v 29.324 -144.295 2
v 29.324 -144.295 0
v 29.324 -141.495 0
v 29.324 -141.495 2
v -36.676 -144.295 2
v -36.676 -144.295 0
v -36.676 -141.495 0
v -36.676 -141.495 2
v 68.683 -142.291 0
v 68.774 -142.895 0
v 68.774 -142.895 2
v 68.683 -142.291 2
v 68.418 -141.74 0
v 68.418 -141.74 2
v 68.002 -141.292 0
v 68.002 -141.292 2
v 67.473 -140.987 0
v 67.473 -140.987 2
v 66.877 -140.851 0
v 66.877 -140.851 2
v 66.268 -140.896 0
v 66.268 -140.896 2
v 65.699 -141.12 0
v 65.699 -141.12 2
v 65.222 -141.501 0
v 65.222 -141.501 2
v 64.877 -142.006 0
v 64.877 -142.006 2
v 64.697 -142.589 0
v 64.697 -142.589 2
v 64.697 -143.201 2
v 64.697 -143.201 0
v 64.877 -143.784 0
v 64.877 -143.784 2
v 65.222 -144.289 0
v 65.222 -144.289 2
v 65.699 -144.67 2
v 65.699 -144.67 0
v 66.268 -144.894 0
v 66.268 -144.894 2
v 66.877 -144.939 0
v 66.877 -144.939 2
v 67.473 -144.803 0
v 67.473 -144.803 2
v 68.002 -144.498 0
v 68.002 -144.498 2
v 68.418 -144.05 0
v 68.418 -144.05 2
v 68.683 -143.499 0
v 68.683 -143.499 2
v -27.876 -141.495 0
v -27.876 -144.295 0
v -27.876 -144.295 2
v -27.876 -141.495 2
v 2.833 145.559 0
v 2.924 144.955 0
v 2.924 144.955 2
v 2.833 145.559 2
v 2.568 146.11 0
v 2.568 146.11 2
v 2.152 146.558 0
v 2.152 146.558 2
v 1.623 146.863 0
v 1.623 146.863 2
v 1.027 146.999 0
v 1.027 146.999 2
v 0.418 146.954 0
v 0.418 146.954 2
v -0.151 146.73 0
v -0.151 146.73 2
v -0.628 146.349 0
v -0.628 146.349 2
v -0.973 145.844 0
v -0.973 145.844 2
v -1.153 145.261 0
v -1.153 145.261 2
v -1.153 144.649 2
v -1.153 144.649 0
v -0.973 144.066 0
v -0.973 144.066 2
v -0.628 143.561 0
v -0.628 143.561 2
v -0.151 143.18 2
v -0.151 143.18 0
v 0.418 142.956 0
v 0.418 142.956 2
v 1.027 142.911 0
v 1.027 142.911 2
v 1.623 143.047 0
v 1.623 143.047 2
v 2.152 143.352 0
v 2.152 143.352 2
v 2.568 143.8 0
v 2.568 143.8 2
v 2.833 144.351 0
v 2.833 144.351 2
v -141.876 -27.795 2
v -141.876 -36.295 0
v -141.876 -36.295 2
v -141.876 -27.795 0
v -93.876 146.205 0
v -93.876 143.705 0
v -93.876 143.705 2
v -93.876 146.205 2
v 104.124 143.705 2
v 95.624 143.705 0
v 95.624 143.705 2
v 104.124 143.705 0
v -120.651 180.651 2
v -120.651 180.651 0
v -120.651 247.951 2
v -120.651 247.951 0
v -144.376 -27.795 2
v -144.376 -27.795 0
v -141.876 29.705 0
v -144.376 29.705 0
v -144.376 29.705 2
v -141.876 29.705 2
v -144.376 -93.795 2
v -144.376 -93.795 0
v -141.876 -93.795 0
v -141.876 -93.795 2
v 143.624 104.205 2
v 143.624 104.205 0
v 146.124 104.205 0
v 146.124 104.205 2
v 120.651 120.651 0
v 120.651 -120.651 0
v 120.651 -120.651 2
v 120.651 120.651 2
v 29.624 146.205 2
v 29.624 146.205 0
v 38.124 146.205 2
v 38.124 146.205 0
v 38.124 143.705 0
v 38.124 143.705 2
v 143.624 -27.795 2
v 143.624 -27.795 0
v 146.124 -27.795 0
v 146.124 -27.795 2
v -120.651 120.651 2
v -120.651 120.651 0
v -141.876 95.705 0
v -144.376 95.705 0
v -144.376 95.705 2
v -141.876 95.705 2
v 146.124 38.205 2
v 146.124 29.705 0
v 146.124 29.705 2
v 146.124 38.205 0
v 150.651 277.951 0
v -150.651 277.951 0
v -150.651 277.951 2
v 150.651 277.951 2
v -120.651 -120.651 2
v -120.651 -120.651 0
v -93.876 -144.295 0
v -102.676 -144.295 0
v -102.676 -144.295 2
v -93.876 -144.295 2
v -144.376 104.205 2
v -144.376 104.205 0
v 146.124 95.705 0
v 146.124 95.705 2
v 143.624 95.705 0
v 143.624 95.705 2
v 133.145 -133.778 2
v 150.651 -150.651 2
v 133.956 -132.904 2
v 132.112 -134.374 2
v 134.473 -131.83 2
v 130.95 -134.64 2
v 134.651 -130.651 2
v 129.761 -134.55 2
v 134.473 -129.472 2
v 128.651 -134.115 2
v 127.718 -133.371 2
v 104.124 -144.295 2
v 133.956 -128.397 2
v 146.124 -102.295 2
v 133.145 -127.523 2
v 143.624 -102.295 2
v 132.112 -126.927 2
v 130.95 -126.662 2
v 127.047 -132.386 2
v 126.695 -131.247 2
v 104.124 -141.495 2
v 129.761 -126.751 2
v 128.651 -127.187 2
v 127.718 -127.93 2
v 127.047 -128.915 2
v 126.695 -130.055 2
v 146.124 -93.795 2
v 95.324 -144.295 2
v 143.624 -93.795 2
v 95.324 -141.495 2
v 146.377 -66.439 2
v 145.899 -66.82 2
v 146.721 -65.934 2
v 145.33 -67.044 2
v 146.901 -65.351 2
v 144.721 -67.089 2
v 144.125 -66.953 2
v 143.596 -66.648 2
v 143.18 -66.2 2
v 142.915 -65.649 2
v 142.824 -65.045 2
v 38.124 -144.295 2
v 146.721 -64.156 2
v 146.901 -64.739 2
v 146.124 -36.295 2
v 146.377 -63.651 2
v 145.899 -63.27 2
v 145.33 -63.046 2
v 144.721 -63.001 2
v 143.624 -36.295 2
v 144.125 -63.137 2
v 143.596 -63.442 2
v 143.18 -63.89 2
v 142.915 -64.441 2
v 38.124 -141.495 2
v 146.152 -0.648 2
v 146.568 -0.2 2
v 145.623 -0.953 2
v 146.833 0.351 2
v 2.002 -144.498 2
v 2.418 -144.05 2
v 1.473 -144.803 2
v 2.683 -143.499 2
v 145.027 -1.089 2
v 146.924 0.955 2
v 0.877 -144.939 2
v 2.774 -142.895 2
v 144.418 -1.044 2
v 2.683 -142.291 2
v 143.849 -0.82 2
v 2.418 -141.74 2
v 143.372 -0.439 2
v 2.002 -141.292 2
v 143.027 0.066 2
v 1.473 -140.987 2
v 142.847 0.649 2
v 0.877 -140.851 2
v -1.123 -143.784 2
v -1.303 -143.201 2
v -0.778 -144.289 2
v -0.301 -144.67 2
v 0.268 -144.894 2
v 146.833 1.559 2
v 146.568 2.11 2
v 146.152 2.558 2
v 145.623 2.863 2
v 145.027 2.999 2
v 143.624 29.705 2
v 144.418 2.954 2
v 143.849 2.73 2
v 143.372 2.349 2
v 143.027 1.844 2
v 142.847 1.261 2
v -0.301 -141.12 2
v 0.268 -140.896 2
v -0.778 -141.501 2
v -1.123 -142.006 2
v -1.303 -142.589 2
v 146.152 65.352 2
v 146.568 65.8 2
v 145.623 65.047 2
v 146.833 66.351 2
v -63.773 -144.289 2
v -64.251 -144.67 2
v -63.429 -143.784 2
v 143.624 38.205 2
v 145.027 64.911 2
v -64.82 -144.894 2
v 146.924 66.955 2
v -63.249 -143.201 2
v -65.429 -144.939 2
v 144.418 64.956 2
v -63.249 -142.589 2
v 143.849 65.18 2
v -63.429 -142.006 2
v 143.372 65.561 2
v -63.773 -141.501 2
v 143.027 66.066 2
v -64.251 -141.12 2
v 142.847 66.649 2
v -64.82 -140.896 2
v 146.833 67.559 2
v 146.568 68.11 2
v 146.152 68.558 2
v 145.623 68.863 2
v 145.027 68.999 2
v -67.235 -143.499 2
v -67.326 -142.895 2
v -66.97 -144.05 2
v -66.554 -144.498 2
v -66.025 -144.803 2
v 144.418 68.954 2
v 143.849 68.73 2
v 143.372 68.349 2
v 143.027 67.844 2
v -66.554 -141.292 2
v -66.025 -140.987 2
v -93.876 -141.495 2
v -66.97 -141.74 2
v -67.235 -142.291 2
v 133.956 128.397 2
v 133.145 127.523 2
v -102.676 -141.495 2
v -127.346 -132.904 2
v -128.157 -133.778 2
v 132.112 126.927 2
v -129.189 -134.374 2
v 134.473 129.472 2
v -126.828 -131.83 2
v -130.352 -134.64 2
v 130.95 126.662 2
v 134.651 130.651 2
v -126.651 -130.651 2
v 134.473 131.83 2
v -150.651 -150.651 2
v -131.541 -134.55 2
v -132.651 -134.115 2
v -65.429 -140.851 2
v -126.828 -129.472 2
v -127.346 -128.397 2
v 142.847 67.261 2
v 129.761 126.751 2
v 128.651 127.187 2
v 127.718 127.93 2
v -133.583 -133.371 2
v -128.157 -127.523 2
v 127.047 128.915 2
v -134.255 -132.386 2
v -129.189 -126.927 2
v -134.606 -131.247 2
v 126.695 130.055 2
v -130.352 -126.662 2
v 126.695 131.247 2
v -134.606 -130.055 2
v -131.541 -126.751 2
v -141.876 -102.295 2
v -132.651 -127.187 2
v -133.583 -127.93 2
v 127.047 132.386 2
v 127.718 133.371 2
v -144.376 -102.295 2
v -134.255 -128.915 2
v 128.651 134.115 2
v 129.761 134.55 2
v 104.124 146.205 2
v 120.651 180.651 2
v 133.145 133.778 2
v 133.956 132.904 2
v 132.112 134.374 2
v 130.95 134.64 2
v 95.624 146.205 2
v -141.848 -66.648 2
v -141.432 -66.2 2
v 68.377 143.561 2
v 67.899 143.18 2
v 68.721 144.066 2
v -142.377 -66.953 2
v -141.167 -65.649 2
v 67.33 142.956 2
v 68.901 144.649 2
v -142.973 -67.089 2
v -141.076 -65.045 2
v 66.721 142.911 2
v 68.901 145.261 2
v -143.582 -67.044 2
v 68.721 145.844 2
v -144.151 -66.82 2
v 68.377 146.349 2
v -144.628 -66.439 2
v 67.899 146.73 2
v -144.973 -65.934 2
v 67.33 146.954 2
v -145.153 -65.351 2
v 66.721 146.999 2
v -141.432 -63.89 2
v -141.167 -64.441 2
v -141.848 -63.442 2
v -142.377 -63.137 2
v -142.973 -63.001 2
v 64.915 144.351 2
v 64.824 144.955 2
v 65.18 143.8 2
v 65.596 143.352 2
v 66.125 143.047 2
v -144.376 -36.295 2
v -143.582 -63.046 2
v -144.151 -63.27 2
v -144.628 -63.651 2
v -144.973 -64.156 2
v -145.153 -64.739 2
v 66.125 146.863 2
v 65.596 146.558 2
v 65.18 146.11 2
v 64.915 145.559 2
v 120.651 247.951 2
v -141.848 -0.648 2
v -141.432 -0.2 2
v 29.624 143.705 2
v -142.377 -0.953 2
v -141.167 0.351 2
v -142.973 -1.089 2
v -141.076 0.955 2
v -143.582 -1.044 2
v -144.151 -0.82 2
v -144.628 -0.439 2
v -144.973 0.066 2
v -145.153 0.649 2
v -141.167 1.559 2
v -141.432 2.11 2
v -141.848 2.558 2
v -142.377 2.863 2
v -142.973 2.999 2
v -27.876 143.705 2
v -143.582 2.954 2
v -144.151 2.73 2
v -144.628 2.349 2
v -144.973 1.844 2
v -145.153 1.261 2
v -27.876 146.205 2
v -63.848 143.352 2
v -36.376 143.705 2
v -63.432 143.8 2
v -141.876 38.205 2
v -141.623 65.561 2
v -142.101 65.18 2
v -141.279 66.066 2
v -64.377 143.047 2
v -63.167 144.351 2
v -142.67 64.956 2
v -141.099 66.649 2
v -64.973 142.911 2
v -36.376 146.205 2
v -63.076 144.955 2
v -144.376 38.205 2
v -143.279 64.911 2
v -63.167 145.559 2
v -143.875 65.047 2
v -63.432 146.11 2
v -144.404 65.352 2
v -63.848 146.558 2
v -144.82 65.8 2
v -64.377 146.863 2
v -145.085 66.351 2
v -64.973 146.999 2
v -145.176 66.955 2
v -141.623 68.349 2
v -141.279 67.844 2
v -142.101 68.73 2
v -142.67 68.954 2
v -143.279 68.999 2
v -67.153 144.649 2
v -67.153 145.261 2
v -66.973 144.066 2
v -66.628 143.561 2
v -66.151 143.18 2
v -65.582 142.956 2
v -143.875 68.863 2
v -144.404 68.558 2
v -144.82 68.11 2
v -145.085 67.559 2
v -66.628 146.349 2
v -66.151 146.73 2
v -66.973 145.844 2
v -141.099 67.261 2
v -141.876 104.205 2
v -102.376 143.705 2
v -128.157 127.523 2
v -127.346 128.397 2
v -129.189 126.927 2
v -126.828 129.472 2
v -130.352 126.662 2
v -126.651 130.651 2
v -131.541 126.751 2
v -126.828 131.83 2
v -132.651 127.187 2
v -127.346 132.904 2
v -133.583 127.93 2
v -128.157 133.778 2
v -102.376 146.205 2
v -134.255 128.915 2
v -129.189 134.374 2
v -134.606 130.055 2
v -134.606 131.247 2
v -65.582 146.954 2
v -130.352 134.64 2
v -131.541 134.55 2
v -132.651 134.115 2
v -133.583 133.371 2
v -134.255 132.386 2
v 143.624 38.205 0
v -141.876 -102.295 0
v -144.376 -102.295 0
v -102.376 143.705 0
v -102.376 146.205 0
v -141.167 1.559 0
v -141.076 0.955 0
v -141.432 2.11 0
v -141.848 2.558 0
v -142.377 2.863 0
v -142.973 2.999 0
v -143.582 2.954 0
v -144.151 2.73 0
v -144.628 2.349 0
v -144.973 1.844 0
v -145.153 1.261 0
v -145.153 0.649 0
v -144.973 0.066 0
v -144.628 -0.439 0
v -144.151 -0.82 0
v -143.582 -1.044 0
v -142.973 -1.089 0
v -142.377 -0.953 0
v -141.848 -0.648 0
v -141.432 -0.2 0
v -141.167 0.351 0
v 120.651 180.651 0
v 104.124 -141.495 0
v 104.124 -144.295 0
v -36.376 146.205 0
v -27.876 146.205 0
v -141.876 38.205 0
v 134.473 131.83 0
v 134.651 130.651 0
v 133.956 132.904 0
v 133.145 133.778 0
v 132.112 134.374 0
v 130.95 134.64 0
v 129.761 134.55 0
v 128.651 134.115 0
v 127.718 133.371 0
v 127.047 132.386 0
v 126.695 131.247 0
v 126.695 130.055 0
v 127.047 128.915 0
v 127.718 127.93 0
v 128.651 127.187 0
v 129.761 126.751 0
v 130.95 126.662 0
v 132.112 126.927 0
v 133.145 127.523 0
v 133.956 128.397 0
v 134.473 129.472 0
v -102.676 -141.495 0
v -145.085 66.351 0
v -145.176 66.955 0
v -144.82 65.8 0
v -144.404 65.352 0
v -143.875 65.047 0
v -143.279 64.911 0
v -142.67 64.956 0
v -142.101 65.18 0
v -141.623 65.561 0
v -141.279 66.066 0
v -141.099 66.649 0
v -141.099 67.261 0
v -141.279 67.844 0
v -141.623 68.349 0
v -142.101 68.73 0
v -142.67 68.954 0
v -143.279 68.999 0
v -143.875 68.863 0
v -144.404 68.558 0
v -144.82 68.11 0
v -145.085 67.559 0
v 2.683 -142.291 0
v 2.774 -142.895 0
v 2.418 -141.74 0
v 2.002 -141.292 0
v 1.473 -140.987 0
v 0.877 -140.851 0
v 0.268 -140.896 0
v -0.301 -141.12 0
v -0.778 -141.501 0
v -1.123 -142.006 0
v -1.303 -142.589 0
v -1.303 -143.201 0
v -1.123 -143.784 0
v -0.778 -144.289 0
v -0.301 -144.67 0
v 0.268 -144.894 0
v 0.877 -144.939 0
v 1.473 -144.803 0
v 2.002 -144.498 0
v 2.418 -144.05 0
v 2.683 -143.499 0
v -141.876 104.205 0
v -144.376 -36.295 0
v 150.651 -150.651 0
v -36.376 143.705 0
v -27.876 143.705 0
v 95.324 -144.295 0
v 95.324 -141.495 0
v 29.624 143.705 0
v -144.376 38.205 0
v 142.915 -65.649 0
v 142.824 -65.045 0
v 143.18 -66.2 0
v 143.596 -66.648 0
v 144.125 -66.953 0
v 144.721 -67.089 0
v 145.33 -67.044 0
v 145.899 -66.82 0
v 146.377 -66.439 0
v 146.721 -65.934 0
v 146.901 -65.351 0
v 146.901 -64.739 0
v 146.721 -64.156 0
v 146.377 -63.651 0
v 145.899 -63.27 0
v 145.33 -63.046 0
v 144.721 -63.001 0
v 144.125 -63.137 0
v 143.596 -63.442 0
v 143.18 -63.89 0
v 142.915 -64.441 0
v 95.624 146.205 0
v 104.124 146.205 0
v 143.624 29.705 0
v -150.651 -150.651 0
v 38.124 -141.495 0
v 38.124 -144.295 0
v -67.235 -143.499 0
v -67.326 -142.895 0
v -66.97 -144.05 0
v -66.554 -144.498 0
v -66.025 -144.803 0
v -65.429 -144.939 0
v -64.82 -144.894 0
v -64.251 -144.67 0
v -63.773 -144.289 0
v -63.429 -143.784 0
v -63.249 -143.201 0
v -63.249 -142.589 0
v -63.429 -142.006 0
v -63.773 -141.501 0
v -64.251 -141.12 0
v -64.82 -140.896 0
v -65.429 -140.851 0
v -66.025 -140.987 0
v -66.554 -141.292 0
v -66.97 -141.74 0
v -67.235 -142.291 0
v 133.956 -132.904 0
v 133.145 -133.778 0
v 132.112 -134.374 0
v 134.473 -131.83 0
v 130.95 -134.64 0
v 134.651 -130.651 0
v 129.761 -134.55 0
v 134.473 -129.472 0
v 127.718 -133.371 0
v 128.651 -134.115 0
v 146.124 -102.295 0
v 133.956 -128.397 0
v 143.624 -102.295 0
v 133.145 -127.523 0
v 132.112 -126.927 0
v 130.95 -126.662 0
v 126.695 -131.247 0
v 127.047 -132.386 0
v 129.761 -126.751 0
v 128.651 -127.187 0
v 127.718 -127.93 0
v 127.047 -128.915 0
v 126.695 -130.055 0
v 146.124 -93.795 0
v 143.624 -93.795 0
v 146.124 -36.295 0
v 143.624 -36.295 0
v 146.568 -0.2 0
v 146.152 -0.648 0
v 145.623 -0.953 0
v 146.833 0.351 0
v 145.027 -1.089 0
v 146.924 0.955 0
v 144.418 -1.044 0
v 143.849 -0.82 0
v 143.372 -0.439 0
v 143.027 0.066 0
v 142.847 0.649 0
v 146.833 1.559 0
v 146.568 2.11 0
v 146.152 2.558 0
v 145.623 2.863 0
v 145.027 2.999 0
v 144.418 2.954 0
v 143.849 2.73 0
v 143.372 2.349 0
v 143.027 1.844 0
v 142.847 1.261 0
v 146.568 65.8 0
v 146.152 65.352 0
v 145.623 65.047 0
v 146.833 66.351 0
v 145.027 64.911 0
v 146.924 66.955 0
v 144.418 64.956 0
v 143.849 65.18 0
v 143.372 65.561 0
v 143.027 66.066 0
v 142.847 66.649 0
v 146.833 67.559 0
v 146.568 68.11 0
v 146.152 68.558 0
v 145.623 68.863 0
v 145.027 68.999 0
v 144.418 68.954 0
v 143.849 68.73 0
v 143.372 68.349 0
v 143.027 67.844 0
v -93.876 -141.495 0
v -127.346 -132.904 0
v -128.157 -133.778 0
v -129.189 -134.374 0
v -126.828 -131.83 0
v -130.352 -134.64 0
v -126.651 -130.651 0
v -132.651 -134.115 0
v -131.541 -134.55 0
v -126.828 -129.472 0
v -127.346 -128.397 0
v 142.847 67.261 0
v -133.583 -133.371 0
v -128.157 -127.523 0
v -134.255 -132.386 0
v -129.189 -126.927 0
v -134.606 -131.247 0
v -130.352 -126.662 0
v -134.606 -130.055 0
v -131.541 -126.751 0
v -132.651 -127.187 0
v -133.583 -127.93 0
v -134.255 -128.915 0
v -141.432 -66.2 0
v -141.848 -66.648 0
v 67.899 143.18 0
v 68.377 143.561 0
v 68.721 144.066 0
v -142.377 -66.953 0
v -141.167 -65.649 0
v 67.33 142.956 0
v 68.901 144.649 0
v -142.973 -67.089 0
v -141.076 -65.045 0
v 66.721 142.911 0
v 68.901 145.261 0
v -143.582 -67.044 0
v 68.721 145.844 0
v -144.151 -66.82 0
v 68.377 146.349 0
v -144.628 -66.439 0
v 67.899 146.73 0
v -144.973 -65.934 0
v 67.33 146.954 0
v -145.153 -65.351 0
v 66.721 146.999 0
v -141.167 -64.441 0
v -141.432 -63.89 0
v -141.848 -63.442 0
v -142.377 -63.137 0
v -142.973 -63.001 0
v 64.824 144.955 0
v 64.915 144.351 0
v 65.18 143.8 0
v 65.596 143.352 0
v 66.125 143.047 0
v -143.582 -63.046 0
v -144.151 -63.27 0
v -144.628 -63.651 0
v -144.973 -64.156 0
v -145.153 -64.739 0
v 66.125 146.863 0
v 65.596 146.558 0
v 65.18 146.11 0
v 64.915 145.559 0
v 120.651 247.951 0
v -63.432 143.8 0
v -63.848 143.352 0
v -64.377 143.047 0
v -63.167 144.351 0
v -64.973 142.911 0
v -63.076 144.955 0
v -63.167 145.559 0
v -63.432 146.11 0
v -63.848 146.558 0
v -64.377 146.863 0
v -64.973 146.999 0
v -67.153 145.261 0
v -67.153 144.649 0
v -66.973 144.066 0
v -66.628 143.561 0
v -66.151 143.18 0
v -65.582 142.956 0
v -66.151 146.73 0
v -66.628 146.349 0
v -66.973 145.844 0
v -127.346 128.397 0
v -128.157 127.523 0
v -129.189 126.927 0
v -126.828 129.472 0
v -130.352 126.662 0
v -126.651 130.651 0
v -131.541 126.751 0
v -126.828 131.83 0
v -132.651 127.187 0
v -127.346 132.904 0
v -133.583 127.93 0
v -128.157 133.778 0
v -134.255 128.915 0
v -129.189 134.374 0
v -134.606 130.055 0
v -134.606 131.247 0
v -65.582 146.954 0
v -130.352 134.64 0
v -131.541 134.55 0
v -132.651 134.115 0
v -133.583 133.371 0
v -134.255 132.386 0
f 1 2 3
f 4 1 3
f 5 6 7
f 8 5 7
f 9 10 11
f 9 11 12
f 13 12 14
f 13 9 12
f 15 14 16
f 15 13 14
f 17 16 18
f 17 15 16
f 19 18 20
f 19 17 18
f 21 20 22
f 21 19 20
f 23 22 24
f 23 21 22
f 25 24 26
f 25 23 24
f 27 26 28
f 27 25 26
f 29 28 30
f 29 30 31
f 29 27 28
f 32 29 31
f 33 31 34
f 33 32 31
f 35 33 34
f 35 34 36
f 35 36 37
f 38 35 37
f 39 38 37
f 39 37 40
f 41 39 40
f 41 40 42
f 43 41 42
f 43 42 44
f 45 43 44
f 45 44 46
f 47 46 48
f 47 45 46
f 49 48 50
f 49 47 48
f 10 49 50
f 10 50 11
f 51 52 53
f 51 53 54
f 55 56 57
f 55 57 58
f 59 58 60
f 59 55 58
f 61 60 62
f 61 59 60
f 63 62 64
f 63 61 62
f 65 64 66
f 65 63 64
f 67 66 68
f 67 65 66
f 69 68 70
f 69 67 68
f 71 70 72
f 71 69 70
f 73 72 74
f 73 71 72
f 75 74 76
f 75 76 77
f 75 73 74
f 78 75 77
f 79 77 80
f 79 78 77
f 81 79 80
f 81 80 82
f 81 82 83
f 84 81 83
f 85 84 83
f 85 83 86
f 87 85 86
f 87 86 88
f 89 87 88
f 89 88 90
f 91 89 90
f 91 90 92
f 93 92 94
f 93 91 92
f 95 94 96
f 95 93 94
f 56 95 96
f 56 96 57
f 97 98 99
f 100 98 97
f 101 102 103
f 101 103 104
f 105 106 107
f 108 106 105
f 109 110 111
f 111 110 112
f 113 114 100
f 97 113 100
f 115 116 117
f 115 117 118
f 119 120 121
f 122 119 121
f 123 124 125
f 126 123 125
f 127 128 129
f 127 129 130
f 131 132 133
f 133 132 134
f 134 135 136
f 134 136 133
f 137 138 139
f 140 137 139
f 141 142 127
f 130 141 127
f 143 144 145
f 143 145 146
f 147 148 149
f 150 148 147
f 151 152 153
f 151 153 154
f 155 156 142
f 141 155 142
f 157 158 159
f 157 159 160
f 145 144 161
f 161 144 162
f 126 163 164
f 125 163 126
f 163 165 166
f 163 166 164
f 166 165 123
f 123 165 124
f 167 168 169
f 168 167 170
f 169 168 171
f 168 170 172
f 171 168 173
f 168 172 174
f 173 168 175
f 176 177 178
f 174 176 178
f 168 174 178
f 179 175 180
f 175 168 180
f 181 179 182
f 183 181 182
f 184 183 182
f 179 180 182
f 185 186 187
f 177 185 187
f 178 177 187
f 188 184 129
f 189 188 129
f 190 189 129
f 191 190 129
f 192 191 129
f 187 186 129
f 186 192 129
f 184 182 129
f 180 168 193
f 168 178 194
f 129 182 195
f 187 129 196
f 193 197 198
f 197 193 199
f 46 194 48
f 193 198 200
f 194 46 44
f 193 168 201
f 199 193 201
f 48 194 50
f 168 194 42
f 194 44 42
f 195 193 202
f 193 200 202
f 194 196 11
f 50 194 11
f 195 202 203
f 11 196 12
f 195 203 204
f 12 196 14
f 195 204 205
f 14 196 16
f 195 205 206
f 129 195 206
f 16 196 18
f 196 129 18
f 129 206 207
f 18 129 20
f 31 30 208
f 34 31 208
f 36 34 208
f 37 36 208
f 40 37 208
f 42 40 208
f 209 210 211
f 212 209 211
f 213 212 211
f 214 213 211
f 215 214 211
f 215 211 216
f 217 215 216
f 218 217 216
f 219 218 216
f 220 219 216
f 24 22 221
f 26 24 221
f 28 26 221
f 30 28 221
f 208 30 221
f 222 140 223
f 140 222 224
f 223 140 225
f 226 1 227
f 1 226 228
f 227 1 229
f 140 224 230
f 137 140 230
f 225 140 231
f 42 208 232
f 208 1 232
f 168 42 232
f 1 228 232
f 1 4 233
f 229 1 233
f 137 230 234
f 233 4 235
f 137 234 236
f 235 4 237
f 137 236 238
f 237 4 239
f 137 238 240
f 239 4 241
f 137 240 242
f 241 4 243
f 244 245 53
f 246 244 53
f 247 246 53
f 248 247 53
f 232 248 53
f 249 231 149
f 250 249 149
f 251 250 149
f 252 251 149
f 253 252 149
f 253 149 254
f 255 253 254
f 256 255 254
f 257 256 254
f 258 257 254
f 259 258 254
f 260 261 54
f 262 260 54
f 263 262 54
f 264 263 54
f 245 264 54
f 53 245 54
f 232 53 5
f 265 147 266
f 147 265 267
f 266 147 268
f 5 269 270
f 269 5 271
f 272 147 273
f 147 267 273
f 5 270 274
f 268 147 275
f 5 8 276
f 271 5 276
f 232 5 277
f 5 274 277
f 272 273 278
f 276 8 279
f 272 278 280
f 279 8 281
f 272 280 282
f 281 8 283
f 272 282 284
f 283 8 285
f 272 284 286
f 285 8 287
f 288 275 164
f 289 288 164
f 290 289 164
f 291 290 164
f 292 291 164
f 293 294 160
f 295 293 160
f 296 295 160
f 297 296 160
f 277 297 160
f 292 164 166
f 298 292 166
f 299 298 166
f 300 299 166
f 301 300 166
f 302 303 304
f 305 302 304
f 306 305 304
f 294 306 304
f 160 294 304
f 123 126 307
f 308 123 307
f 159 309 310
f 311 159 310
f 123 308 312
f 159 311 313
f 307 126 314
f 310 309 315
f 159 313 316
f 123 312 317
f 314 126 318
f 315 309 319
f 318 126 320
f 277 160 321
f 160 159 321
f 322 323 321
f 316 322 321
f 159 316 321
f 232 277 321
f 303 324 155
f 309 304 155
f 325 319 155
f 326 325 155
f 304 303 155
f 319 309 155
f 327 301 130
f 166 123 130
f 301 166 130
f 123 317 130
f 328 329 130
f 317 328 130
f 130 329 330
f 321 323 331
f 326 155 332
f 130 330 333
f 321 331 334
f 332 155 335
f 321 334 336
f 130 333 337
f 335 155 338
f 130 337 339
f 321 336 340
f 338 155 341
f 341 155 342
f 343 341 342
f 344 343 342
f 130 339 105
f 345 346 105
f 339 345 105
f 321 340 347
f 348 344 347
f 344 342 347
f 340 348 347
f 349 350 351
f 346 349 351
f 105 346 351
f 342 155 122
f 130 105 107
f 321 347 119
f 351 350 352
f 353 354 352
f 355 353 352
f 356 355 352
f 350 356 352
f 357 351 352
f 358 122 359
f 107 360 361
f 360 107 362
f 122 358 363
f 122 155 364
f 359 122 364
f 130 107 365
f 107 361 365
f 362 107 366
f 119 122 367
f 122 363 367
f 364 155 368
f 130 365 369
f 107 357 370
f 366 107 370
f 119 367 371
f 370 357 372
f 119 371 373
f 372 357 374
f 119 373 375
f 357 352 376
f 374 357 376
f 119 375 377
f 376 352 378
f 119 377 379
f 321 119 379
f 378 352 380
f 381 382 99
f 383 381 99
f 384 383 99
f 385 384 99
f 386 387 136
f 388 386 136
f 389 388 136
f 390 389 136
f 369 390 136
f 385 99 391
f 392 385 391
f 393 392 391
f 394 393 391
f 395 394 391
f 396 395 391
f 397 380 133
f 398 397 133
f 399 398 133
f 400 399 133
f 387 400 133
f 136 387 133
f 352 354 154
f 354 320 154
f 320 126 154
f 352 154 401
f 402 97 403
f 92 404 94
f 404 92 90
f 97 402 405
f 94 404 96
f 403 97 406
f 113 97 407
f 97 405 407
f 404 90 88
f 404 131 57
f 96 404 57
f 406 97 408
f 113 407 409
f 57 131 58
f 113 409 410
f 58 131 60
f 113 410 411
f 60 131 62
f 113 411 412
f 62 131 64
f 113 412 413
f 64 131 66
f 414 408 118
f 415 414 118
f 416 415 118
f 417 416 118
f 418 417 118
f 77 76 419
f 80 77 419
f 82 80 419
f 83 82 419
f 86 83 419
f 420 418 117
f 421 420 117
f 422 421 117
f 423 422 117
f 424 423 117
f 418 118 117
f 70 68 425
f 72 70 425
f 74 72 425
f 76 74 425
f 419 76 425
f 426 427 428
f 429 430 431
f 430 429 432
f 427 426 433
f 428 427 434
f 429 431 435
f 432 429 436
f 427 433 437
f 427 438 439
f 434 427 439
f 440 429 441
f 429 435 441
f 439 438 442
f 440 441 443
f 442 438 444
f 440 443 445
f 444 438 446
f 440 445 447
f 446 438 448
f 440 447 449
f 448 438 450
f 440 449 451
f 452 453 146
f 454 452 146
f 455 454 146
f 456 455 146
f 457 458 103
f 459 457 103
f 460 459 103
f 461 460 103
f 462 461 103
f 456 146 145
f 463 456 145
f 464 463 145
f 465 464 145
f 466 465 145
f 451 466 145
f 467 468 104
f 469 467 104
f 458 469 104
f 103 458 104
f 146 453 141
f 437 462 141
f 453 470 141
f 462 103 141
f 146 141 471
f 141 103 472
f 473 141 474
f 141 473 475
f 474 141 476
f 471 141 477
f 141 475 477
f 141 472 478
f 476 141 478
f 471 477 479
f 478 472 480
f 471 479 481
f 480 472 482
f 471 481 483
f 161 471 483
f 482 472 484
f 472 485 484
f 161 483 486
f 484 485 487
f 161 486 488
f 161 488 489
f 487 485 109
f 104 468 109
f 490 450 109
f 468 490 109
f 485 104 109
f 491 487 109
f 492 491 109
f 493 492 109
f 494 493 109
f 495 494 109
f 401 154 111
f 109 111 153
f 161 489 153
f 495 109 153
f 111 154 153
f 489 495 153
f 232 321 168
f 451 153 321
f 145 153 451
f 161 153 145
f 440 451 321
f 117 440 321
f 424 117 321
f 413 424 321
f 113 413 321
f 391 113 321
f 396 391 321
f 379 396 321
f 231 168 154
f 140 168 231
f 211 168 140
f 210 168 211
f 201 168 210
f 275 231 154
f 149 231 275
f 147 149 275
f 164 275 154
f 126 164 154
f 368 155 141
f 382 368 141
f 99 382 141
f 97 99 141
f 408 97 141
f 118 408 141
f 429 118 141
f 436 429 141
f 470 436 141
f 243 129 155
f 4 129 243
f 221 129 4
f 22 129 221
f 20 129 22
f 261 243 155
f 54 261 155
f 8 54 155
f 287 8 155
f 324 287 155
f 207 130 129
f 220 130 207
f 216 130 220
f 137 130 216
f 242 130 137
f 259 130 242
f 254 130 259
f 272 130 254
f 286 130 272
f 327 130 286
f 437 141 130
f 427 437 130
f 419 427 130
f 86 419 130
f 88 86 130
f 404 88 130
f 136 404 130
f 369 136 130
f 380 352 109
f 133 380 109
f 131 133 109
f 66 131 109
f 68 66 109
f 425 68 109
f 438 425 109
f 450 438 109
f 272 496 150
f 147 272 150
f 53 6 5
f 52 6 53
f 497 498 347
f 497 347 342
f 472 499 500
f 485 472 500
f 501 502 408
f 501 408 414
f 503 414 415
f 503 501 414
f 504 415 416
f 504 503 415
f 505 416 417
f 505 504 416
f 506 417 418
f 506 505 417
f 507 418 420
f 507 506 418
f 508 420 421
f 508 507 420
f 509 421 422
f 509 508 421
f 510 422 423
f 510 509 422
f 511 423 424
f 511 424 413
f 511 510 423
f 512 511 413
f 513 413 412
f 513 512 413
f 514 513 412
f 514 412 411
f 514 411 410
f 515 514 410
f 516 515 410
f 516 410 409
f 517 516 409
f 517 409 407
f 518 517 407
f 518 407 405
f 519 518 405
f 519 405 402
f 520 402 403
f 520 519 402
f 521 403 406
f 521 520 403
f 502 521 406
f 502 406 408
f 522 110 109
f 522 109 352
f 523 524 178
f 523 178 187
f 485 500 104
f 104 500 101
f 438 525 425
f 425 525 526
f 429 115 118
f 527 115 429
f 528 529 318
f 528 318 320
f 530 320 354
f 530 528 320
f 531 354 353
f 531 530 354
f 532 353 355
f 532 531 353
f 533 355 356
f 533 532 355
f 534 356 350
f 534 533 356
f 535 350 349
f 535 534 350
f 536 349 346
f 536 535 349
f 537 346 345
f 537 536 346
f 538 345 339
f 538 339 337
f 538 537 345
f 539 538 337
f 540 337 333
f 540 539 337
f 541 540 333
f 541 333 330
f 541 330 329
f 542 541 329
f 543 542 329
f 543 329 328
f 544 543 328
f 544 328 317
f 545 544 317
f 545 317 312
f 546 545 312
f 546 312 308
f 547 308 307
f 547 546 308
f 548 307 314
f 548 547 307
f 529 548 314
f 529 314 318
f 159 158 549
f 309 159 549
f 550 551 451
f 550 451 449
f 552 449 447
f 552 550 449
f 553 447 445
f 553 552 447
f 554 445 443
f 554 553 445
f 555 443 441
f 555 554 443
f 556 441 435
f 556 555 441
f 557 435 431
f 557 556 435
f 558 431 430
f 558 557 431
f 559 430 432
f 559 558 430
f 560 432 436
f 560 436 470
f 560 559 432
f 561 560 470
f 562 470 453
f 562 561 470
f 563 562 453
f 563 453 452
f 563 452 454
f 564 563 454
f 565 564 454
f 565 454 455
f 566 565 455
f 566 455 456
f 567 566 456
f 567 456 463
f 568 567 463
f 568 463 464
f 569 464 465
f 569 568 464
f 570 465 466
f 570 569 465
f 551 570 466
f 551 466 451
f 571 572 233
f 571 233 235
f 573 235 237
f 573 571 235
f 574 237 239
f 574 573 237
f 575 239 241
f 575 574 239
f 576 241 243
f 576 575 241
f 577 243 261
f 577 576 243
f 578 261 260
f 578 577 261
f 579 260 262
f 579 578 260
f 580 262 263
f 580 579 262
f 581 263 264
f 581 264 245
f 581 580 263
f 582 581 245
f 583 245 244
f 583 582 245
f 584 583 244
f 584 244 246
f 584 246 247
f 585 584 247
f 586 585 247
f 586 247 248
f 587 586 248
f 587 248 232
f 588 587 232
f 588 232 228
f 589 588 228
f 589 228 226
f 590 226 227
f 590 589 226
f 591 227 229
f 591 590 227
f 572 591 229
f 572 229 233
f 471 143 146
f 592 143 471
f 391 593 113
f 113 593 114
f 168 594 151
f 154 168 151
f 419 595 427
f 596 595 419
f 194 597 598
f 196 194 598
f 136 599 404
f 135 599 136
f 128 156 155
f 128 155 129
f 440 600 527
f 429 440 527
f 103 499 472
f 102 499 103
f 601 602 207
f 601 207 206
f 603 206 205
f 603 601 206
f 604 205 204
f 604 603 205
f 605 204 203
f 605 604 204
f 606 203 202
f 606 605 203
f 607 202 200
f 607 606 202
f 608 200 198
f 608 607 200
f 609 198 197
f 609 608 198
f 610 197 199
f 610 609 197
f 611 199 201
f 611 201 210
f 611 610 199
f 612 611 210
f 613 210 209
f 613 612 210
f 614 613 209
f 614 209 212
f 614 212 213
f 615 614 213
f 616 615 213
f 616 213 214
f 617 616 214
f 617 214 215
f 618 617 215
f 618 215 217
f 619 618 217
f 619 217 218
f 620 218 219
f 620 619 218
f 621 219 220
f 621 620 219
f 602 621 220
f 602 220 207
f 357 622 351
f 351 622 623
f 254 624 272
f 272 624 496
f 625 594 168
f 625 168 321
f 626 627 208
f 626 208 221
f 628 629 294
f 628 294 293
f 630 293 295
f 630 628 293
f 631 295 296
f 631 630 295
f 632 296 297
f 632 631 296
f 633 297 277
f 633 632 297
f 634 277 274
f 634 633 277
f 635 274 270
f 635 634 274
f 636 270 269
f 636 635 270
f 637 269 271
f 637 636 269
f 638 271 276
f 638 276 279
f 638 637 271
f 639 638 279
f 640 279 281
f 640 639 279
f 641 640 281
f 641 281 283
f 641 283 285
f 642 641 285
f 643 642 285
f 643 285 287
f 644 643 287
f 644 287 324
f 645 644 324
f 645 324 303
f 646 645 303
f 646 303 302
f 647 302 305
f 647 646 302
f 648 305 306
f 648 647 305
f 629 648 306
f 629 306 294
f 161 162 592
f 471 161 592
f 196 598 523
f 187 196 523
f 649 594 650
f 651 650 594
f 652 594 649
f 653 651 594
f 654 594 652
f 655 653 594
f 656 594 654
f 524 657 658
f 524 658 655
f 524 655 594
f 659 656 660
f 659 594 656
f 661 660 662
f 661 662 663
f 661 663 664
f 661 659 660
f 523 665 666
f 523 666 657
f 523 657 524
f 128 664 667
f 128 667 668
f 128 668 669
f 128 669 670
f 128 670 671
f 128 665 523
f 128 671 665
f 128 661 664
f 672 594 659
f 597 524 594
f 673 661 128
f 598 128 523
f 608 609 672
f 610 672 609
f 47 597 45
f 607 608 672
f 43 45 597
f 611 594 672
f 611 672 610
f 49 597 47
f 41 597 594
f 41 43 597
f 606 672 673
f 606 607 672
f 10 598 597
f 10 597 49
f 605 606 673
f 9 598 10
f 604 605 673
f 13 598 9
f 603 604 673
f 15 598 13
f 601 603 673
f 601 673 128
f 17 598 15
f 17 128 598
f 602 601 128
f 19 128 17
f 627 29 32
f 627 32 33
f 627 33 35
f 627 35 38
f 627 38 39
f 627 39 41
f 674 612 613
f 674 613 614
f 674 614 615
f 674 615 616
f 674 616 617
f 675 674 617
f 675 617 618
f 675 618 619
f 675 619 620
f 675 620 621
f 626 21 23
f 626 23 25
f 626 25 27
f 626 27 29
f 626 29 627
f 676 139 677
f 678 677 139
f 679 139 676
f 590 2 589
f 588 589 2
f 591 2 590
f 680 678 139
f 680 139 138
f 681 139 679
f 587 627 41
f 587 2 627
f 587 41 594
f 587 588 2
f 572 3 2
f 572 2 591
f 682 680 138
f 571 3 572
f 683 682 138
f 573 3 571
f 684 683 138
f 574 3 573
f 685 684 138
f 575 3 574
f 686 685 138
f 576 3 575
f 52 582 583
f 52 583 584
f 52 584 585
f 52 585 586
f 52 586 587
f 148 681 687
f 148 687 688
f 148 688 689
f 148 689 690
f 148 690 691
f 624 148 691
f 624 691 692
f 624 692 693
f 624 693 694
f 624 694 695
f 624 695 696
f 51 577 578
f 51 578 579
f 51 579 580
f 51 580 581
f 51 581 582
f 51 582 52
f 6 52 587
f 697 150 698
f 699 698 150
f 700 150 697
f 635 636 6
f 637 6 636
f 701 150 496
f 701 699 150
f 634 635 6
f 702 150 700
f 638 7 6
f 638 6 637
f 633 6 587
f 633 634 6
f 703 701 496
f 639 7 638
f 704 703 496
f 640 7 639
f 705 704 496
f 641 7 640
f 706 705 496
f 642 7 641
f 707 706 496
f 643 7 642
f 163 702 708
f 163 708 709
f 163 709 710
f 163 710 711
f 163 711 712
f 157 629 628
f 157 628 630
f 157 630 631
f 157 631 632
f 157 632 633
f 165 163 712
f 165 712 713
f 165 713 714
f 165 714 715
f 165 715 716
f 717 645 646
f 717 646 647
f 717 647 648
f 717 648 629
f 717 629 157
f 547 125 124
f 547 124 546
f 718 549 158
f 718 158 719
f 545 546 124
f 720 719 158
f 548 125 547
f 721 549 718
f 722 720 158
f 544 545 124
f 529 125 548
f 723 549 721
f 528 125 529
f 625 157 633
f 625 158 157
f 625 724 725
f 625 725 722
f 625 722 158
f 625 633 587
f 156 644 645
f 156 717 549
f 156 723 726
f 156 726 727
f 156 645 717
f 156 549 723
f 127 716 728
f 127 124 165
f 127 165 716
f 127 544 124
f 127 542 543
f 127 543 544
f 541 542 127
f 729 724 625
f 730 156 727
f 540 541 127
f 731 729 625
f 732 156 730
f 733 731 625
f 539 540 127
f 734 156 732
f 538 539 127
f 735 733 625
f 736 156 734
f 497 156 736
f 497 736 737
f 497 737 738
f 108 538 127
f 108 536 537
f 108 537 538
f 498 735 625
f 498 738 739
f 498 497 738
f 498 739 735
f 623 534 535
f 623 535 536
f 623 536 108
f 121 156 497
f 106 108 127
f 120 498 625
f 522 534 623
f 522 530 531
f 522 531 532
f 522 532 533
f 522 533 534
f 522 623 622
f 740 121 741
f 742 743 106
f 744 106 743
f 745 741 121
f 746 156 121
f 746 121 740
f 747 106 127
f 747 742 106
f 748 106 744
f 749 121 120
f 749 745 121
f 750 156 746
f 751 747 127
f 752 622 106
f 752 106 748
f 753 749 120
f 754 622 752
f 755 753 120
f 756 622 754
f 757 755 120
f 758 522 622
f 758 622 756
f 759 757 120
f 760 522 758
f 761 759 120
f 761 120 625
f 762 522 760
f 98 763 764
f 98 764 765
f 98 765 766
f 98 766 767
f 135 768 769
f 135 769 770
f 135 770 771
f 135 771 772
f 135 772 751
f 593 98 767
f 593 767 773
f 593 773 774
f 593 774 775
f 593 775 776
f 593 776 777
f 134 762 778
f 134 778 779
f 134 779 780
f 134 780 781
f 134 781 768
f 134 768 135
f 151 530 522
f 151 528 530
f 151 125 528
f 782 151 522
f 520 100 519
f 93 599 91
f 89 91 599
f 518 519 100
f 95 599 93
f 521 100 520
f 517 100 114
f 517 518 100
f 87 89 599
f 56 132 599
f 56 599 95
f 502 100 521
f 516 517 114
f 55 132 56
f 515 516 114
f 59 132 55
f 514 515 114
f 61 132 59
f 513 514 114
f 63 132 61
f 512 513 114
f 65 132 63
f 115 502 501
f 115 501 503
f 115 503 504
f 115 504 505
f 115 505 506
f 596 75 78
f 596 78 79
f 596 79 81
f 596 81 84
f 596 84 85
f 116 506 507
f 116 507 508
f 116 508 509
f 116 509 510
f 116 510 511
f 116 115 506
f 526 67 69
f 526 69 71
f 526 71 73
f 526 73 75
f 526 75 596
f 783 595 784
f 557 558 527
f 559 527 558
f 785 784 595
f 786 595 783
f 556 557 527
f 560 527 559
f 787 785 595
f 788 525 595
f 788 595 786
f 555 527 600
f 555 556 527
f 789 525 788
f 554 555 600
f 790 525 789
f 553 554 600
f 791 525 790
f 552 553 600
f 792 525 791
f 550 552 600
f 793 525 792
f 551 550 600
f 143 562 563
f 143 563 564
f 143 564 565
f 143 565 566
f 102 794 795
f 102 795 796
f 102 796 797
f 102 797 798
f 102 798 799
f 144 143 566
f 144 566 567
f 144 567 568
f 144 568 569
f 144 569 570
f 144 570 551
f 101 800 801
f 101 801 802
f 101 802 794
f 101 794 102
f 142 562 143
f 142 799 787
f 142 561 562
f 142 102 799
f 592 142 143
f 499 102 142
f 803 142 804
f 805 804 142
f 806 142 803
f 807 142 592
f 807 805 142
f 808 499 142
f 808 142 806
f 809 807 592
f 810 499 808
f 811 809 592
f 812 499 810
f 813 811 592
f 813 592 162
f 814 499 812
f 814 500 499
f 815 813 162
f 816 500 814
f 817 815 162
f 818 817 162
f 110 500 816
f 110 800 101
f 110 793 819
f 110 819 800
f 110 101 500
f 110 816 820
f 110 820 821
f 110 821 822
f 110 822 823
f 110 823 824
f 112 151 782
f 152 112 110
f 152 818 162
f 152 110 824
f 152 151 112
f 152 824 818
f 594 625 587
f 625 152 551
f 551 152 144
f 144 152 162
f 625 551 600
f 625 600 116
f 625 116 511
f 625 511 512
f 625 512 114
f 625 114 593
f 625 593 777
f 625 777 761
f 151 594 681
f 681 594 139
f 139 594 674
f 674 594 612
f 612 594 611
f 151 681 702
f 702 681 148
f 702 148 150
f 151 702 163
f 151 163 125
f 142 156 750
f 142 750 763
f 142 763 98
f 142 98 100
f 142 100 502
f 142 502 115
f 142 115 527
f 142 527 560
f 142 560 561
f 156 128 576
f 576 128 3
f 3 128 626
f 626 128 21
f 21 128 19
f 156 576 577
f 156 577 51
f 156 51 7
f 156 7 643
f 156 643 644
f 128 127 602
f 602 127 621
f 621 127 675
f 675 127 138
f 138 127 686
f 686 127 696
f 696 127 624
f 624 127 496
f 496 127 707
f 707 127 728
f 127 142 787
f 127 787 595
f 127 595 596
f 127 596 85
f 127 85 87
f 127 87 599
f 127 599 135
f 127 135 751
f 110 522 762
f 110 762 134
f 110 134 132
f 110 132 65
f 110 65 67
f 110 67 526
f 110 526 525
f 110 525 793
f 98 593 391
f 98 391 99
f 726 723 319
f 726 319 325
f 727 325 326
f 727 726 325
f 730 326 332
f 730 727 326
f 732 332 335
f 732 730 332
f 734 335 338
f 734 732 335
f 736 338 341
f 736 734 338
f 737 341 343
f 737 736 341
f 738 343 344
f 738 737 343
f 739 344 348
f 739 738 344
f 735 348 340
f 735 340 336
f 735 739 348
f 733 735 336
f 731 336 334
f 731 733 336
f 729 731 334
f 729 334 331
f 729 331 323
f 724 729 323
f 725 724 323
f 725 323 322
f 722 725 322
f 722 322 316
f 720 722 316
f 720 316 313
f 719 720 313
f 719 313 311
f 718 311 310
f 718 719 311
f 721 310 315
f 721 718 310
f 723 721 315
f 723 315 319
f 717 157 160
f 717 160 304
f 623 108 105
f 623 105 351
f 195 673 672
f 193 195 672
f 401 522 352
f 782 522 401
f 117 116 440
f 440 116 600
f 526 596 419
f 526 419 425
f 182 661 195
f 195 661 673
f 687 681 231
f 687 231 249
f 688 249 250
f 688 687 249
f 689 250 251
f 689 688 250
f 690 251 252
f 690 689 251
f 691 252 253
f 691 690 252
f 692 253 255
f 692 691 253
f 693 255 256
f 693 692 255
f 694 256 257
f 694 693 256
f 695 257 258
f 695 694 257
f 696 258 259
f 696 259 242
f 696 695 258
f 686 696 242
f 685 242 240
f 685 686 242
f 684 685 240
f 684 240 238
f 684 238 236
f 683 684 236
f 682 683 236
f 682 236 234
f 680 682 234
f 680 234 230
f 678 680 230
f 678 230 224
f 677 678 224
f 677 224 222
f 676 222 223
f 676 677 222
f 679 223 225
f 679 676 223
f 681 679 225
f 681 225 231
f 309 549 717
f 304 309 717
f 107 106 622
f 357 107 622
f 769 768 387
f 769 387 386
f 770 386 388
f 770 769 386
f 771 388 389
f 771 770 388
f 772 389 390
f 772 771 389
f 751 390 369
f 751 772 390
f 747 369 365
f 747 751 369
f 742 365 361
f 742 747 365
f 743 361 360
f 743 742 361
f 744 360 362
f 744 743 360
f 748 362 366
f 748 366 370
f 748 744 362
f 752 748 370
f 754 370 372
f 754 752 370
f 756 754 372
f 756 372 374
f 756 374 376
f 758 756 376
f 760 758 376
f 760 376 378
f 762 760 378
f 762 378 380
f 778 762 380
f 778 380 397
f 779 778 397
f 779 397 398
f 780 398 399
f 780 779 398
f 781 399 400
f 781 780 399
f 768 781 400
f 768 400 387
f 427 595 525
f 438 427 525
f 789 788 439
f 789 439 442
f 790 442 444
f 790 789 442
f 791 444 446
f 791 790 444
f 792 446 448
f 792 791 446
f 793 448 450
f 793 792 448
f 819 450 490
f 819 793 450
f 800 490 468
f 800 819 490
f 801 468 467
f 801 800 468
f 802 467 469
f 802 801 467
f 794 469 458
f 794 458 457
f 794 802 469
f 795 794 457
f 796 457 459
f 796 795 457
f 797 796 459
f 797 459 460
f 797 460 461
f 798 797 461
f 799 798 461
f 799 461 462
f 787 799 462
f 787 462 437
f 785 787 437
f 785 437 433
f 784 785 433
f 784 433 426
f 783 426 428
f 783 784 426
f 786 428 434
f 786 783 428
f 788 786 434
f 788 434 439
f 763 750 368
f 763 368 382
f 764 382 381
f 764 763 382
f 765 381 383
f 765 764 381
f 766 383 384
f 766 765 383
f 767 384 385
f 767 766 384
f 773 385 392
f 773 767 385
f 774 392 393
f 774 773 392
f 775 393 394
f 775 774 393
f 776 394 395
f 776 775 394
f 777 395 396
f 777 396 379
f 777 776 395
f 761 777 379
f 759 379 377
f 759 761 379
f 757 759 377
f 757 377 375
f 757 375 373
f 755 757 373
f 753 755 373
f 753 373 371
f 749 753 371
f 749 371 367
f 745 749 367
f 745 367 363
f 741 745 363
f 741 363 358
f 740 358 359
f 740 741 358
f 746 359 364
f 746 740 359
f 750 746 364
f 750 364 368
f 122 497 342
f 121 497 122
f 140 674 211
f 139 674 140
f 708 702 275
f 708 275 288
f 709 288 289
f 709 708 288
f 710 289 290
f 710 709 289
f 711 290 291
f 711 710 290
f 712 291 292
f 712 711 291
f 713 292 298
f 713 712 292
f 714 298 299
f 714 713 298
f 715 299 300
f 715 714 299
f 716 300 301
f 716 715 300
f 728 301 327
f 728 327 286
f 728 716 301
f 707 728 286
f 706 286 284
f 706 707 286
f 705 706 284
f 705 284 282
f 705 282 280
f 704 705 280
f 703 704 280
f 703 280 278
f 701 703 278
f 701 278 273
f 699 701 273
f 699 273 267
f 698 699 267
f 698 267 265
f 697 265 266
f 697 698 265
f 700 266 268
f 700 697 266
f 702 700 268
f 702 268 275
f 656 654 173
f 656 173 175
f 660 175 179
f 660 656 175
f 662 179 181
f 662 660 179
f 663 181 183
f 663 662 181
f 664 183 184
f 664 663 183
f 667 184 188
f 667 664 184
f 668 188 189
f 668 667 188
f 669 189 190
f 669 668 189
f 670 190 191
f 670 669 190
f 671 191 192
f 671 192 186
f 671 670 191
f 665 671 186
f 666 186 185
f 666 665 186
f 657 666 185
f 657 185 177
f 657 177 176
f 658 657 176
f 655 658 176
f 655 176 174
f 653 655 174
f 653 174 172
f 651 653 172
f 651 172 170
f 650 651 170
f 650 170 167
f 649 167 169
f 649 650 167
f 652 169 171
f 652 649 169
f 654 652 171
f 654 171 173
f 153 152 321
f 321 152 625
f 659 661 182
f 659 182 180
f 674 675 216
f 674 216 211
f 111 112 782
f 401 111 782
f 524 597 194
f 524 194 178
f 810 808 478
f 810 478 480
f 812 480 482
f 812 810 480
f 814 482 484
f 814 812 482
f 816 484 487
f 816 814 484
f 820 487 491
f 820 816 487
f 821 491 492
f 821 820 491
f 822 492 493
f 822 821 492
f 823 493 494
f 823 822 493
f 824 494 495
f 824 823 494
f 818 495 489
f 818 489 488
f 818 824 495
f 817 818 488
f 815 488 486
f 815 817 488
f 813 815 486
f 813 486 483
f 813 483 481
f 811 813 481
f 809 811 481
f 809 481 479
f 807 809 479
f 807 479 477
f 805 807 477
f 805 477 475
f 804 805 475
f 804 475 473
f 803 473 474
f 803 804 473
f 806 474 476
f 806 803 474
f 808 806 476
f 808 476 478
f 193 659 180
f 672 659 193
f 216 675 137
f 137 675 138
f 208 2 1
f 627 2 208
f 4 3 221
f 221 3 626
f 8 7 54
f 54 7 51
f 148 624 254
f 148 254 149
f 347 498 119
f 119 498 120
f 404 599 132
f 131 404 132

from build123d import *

# Parameters (mm, degrees)
SKETCH_1_R      = 2.05
SKETCH_1_R_2    = 4
SKETCH_1_W      = 8.8
SKETCH_1_H      = 2.8
SKETCH_1_W_2    = 2.5
SKETCH_1_H_2    = 8.5
SKETCH_1_W_3    = 8.5
SKETCH_1_H_3    = 2.5
SKETCH_1_W_4    = 241.301375666
SKETCH_1_H_4    = 241.301375666
SKETCH_1_H_5    = 67.3
EXTRUDE_1_DEPTH = 2


with BuildPart() as part:
    # 草图1 → 凸台-拉伸1 (new body)
    with BuildSketch(Plane.XY):
        Polygon((150.650687833, -150.650687833), (-150.650687833, -150.650687833), (-150.650687833, 150.650687833), (-150.650687833, 277.950687833), (150.650687833, 277.950687833), (150.650687833, 150.650687833), align=None)
        with Locations((0.724285714, -142.895)):
            Circle(SKETCH_1_R, mode=Mode.SUBTRACT)
        with Locations((66.724285714, -142.895)):
            Circle(SKETCH_1_R, mode=Mode.SUBTRACT)
        with Locations(Location((-65.275714286, -142.895, 0), (0, 0, 180))):
            Circle(SKETCH_1_R, mode=Mode.SUBTRACT)
        with Locations(Location((-143.125714286, 66.955, 0), (0, 0, 180))):
            Circle(SKETCH_1_R, mode=Mode.SUBTRACT)
        with Locations((-143.125714286, 0.955)):
            Circle(SKETCH_1_R, mode=Mode.SUBTRACT)
        with Locations((-143.125714286, -65.045)):
            Circle(SKETCH_1_R, mode=Mode.SUBTRACT)
        with Locations(Location((66.874285714, 144.955, 0), (0, 0, 180))):
            Circle(SKETCH_1_R, mode=Mode.SUBTRACT)
        with Locations((0.874285714, 144.955)):
            Circle(SKETCH_1_R, mode=Mode.SUBTRACT)
        with Locations((-65.125714286, 144.955)):
            Circle(SKETCH_1_R, mode=Mode.SUBTRACT)
        with Locations(Location((144.874285714, -65.045, 0), (0, 0, 180))):
            Circle(SKETCH_1_R, mode=Mode.SUBTRACT)
        with Locations((144.874285714, 0.955)):
            Circle(SKETCH_1_R, mode=Mode.SUBTRACT)
        with Locations((144.874285714, 66.955)):
            Circle(SKETCH_1_R, mode=Mode.SUBTRACT)
        with Locations((-130.650687833, -130.650687833)):
            Circle(SKETCH_1_R_2, mode=Mode.SUBTRACT)
        with Locations((-130.650687833, 130.650687833)):
            Circle(SKETCH_1_R_2, mode=Mode.SUBTRACT)
        with Locations((130.650687833, 130.650687833)):
            Circle(SKETCH_1_R_2, mode=Mode.SUBTRACT)
        with Locations((130.650687833, -130.650687833)):
            Circle(SKETCH_1_R_2, mode=Mode.SUBTRACT)
        with Locations((99.724285714, -142.895)):
            Rectangle(SKETCH_1_W, SKETCH_1_H, mode=Mode.SUBTRACT)
        with Locations((33.724285714, -142.895)):
            Rectangle(SKETCH_1_W, SKETCH_1_H, mode=Mode.SUBTRACT)
        with Locations((-32.275714286, -142.895)):
            Rectangle(SKETCH_1_W, SKETCH_1_H, mode=Mode.SUBTRACT)
        with Locations((-98.275714286, -142.895)):
            Rectangle(SKETCH_1_W, SKETCH_1_H, mode=Mode.SUBTRACT)
        with Locations((-143.125714286, 99.955)):
            Rectangle(SKETCH_1_W_2, SKETCH_1_H_2, mode=Mode.SUBTRACT)
        with Locations((-143.125714286, 33.955)):
            Rectangle(SKETCH_1_W_2, SKETCH_1_H_2, mode=Mode.SUBTRACT)
        with Locations((-143.125714286, -32.045)):
            Rectangle(SKETCH_1_W_2, SKETCH_1_H_2, mode=Mode.SUBTRACT)
        with Locations((-143.125714286, -98.045)):
            Rectangle(SKETCH_1_W_2, SKETCH_1_H_2, mode=Mode.SUBTRACT)
        with Locations((99.874285714, 144.955)):
            Rectangle(SKETCH_1_W_3, SKETCH_1_H_3, mode=Mode.SUBTRACT)
        with Locations((33.874285714, 144.955)):
            Rectangle(SKETCH_1_W_3, SKETCH_1_H_3, mode=Mode.SUBTRACT)
        with Locations((-32.125714286, 144.955)):
            Rectangle(SKETCH_1_W_3, SKETCH_1_H_3, mode=Mode.SUBTRACT)
        with Locations((-98.125714286, 144.955)):
            Rectangle(SKETCH_1_W_3, SKETCH_1_H_3, mode=Mode.SUBTRACT)
        with Locations((144.874285714, -98.045)):
            Rectangle(SKETCH_1_W_2, SKETCH_1_H_2, mode=Mode.SUBTRACT)
        with Locations((144.874285714, -32.045)):
            Rectangle(SKETCH_1_W_2, SKETCH_1_H_2, mode=Mode.SUBTRACT)
        with Locations((144.874285714, 33.955)):
            Rectangle(SKETCH_1_W_2, SKETCH_1_H_2, mode=Mode.SUBTRACT)
        with Locations((144.874285714, 99.955)):
            Rectangle(SKETCH_1_W_2, SKETCH_1_H_2, mode=Mode.SUBTRACT)
        Rectangle(SKETCH_1_W_4, SKETCH_1_H_4, mode=Mode.SUBTRACT)
        with Locations((0, 214.300687833)):
            Rectangle(SKETCH_1_W_4, SKETCH_1_H_5, mode=Mode.SUBTRACT)
    extrude(amount=EXTRUDE_1_DEPTH)


solid = part.part
